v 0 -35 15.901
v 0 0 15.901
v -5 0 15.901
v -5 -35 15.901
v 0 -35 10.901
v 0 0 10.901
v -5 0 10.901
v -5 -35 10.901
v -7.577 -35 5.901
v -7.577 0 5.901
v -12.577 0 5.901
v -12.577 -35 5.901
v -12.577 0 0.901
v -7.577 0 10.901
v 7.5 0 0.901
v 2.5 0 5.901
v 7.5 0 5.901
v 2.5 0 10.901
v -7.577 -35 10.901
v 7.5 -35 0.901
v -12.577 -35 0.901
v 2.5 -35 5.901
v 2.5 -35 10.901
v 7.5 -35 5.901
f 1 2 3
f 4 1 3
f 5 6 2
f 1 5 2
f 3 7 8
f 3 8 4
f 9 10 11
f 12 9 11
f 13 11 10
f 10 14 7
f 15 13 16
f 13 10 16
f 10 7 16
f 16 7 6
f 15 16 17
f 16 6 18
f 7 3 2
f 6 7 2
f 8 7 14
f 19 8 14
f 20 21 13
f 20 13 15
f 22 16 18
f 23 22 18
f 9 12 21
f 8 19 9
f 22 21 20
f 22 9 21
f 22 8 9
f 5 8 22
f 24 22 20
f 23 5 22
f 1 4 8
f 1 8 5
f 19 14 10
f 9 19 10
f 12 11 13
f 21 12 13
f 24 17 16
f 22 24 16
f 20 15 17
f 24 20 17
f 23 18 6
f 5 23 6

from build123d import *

# Parameters (mm, degrees)
F0_W     = 2.5
F0_H     = 5
F1_DEPTH = 35


with BuildPart() as f1:
    # F0 (on Front) → F1 (new body)
    with BuildSketch(Plane.XZ):
        with Locations((-3.75, 13.401443)):
            Rectangle(F0_W, F0_H)
        with Locations((-1.25, 13.401443)):
            Rectangle(F0_W, F0_H)
        Polygon((-2.5, 10.901443), (-5, 10.901443), (-7.576827, 10.901443), (-7.576827, 5.901443), (-12.576827, 5.901443), (-12.576827, 0.901443), (7.5, 0.901443), (7.5, 5.901443), (2.5, 5.901443), (2.5, 10.901443), (0, 10.901443), align=None)
    extrude(amount=F1_DEPTH)


solid = f1.part
